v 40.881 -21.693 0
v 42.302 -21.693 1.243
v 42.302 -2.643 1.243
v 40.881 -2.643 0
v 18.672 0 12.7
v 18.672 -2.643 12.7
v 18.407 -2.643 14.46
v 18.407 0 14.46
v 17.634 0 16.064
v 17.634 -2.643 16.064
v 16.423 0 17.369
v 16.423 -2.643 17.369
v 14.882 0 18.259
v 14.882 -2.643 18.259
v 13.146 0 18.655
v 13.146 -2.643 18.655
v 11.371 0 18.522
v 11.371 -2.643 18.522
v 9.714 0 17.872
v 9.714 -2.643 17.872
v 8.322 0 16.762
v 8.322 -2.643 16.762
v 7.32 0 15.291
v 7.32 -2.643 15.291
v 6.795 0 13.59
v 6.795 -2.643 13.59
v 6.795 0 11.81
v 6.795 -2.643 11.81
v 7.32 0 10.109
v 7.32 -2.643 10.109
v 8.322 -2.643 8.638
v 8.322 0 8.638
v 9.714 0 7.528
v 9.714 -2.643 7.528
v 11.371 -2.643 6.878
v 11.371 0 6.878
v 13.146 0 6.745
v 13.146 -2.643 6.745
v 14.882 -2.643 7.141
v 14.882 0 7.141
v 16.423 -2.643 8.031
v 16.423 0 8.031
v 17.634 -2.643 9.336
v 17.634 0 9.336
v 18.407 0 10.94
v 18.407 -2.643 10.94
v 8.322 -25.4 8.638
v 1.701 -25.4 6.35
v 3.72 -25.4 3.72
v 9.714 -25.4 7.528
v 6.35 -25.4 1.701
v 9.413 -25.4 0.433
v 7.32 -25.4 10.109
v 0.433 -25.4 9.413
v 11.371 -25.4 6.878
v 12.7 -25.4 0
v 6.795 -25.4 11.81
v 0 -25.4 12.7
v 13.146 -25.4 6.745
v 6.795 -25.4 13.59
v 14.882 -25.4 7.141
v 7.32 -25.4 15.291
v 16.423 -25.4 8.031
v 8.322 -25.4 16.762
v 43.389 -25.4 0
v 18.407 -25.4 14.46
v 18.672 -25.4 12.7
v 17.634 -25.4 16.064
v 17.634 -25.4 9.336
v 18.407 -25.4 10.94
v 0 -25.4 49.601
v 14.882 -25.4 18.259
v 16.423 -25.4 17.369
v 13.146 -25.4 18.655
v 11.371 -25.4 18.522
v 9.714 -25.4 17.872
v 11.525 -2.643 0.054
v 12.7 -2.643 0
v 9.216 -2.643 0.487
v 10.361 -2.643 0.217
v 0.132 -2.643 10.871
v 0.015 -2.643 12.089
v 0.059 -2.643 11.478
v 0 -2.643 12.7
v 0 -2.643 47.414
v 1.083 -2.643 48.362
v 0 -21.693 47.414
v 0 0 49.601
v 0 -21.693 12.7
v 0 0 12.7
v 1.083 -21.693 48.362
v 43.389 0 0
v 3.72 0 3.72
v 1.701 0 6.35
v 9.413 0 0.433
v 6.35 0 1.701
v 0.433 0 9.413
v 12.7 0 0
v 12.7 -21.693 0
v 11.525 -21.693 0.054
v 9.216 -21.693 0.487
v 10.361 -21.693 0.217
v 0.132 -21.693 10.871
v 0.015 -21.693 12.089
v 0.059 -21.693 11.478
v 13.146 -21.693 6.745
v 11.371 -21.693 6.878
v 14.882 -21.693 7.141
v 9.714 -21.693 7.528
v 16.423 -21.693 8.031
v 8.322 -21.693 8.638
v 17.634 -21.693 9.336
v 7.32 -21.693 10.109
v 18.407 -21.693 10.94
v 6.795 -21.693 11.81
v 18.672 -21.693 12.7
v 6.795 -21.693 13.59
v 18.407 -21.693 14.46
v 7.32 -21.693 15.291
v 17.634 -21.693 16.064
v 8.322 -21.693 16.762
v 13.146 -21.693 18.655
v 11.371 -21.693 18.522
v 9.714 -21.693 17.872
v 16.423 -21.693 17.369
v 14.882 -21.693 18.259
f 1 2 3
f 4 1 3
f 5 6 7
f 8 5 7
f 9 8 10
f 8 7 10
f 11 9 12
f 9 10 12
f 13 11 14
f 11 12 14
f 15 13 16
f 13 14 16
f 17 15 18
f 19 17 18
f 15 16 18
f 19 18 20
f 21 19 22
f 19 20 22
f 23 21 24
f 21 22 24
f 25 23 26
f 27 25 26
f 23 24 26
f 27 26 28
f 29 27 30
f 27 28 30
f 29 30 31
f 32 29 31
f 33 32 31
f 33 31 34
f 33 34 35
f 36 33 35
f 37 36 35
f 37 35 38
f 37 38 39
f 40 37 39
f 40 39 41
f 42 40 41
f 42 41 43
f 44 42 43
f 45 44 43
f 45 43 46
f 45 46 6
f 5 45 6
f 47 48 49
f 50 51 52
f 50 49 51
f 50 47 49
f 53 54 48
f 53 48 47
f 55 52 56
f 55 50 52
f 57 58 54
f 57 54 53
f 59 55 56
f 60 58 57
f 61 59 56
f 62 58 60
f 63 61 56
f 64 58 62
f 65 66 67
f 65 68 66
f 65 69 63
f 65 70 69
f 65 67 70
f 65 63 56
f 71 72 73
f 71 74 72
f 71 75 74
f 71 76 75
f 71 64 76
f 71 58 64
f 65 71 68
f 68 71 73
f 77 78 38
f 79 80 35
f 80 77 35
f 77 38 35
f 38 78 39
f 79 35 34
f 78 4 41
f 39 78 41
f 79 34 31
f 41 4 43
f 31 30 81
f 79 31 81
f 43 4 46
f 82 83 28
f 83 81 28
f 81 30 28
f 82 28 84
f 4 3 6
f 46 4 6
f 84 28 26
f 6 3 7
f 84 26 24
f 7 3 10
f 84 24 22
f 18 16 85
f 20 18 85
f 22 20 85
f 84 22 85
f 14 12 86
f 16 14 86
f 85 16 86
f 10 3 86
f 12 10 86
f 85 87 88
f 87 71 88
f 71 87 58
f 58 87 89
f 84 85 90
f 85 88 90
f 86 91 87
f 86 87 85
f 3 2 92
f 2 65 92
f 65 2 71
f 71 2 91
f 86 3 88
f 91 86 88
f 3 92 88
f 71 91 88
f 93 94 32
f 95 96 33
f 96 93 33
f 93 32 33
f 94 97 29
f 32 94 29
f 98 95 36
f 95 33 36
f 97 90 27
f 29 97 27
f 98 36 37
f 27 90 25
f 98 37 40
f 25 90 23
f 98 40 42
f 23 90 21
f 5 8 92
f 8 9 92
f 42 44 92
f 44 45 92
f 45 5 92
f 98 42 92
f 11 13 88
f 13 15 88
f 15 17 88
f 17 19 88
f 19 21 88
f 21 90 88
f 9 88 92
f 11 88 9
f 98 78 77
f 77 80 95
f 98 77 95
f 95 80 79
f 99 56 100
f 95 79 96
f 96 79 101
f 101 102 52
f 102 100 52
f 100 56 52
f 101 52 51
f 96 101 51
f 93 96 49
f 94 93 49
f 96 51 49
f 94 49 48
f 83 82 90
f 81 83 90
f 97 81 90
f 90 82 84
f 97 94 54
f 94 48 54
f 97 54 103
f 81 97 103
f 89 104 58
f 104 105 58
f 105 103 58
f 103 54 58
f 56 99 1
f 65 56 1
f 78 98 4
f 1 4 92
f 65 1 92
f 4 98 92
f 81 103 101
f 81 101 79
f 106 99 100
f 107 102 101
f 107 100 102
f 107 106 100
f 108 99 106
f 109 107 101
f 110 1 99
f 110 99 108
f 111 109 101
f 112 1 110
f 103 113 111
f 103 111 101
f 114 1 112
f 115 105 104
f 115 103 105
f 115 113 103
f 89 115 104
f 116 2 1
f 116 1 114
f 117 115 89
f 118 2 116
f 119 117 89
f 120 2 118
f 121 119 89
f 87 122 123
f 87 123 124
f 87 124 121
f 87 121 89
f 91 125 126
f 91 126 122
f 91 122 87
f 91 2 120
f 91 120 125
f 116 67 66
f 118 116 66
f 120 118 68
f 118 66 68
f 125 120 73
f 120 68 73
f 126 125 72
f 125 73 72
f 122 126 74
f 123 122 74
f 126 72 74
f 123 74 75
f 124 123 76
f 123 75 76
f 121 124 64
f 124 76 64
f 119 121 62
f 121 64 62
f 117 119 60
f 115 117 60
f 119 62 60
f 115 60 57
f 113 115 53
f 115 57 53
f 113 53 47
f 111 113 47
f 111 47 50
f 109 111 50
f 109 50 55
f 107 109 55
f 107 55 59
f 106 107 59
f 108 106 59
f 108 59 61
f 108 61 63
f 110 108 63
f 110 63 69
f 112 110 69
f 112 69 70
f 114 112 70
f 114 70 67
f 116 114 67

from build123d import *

# Parameters (mm, degrees)
F1_DEPTH = 25.4
F2_R     = 12.7
F3_R     = 5.9718786186
F4_DEPTH = 25.401
F5_W     = 19.05
F5_H     = 62.6034842774
F6_DEPTH = 25.4


with BuildPart() as f1:
    # F0 (on Front) → F1 (new body)
    with BuildSketch(Plane.XZ):
        Polygon((0, 0), (43.3889701962, 0), (0, 49.6006347239), align=None)
    extrude(amount=F1_DEPTH)

    # F2
    f2_edges = [f1.edges().sort_by_distance(p)[0] for p in [
        (0, -12.7, 0),
    ]]
    fillet(f2_edges, radius=F2_R)

    # F3 (on face) → F4 (cut, through all)
    with BuildSketch(Plane.XZ.offset(25.4)):
        with Locations((12.7, 12.7)):
            Circle(F3_R)
    extrude(amount=-F4_DEPTH, mode=Mode.SUBTRACT)

    # F5 (on face) → F6 (cut)
    with BuildSketch(Plane(origin=(24.5799735671, 0, 21.5017357432), x_dir=(0, 1, 0), z_dir=(0.7526638098, 0, 0.6584050344))):
        with Locations((-12.1681662276, 4.3852257229)):
            Rectangle(F5_W, F5_H)
    extrude(amount=-F6_DEPTH, mode=Mode.SUBTRACT)


solid = f1.part
